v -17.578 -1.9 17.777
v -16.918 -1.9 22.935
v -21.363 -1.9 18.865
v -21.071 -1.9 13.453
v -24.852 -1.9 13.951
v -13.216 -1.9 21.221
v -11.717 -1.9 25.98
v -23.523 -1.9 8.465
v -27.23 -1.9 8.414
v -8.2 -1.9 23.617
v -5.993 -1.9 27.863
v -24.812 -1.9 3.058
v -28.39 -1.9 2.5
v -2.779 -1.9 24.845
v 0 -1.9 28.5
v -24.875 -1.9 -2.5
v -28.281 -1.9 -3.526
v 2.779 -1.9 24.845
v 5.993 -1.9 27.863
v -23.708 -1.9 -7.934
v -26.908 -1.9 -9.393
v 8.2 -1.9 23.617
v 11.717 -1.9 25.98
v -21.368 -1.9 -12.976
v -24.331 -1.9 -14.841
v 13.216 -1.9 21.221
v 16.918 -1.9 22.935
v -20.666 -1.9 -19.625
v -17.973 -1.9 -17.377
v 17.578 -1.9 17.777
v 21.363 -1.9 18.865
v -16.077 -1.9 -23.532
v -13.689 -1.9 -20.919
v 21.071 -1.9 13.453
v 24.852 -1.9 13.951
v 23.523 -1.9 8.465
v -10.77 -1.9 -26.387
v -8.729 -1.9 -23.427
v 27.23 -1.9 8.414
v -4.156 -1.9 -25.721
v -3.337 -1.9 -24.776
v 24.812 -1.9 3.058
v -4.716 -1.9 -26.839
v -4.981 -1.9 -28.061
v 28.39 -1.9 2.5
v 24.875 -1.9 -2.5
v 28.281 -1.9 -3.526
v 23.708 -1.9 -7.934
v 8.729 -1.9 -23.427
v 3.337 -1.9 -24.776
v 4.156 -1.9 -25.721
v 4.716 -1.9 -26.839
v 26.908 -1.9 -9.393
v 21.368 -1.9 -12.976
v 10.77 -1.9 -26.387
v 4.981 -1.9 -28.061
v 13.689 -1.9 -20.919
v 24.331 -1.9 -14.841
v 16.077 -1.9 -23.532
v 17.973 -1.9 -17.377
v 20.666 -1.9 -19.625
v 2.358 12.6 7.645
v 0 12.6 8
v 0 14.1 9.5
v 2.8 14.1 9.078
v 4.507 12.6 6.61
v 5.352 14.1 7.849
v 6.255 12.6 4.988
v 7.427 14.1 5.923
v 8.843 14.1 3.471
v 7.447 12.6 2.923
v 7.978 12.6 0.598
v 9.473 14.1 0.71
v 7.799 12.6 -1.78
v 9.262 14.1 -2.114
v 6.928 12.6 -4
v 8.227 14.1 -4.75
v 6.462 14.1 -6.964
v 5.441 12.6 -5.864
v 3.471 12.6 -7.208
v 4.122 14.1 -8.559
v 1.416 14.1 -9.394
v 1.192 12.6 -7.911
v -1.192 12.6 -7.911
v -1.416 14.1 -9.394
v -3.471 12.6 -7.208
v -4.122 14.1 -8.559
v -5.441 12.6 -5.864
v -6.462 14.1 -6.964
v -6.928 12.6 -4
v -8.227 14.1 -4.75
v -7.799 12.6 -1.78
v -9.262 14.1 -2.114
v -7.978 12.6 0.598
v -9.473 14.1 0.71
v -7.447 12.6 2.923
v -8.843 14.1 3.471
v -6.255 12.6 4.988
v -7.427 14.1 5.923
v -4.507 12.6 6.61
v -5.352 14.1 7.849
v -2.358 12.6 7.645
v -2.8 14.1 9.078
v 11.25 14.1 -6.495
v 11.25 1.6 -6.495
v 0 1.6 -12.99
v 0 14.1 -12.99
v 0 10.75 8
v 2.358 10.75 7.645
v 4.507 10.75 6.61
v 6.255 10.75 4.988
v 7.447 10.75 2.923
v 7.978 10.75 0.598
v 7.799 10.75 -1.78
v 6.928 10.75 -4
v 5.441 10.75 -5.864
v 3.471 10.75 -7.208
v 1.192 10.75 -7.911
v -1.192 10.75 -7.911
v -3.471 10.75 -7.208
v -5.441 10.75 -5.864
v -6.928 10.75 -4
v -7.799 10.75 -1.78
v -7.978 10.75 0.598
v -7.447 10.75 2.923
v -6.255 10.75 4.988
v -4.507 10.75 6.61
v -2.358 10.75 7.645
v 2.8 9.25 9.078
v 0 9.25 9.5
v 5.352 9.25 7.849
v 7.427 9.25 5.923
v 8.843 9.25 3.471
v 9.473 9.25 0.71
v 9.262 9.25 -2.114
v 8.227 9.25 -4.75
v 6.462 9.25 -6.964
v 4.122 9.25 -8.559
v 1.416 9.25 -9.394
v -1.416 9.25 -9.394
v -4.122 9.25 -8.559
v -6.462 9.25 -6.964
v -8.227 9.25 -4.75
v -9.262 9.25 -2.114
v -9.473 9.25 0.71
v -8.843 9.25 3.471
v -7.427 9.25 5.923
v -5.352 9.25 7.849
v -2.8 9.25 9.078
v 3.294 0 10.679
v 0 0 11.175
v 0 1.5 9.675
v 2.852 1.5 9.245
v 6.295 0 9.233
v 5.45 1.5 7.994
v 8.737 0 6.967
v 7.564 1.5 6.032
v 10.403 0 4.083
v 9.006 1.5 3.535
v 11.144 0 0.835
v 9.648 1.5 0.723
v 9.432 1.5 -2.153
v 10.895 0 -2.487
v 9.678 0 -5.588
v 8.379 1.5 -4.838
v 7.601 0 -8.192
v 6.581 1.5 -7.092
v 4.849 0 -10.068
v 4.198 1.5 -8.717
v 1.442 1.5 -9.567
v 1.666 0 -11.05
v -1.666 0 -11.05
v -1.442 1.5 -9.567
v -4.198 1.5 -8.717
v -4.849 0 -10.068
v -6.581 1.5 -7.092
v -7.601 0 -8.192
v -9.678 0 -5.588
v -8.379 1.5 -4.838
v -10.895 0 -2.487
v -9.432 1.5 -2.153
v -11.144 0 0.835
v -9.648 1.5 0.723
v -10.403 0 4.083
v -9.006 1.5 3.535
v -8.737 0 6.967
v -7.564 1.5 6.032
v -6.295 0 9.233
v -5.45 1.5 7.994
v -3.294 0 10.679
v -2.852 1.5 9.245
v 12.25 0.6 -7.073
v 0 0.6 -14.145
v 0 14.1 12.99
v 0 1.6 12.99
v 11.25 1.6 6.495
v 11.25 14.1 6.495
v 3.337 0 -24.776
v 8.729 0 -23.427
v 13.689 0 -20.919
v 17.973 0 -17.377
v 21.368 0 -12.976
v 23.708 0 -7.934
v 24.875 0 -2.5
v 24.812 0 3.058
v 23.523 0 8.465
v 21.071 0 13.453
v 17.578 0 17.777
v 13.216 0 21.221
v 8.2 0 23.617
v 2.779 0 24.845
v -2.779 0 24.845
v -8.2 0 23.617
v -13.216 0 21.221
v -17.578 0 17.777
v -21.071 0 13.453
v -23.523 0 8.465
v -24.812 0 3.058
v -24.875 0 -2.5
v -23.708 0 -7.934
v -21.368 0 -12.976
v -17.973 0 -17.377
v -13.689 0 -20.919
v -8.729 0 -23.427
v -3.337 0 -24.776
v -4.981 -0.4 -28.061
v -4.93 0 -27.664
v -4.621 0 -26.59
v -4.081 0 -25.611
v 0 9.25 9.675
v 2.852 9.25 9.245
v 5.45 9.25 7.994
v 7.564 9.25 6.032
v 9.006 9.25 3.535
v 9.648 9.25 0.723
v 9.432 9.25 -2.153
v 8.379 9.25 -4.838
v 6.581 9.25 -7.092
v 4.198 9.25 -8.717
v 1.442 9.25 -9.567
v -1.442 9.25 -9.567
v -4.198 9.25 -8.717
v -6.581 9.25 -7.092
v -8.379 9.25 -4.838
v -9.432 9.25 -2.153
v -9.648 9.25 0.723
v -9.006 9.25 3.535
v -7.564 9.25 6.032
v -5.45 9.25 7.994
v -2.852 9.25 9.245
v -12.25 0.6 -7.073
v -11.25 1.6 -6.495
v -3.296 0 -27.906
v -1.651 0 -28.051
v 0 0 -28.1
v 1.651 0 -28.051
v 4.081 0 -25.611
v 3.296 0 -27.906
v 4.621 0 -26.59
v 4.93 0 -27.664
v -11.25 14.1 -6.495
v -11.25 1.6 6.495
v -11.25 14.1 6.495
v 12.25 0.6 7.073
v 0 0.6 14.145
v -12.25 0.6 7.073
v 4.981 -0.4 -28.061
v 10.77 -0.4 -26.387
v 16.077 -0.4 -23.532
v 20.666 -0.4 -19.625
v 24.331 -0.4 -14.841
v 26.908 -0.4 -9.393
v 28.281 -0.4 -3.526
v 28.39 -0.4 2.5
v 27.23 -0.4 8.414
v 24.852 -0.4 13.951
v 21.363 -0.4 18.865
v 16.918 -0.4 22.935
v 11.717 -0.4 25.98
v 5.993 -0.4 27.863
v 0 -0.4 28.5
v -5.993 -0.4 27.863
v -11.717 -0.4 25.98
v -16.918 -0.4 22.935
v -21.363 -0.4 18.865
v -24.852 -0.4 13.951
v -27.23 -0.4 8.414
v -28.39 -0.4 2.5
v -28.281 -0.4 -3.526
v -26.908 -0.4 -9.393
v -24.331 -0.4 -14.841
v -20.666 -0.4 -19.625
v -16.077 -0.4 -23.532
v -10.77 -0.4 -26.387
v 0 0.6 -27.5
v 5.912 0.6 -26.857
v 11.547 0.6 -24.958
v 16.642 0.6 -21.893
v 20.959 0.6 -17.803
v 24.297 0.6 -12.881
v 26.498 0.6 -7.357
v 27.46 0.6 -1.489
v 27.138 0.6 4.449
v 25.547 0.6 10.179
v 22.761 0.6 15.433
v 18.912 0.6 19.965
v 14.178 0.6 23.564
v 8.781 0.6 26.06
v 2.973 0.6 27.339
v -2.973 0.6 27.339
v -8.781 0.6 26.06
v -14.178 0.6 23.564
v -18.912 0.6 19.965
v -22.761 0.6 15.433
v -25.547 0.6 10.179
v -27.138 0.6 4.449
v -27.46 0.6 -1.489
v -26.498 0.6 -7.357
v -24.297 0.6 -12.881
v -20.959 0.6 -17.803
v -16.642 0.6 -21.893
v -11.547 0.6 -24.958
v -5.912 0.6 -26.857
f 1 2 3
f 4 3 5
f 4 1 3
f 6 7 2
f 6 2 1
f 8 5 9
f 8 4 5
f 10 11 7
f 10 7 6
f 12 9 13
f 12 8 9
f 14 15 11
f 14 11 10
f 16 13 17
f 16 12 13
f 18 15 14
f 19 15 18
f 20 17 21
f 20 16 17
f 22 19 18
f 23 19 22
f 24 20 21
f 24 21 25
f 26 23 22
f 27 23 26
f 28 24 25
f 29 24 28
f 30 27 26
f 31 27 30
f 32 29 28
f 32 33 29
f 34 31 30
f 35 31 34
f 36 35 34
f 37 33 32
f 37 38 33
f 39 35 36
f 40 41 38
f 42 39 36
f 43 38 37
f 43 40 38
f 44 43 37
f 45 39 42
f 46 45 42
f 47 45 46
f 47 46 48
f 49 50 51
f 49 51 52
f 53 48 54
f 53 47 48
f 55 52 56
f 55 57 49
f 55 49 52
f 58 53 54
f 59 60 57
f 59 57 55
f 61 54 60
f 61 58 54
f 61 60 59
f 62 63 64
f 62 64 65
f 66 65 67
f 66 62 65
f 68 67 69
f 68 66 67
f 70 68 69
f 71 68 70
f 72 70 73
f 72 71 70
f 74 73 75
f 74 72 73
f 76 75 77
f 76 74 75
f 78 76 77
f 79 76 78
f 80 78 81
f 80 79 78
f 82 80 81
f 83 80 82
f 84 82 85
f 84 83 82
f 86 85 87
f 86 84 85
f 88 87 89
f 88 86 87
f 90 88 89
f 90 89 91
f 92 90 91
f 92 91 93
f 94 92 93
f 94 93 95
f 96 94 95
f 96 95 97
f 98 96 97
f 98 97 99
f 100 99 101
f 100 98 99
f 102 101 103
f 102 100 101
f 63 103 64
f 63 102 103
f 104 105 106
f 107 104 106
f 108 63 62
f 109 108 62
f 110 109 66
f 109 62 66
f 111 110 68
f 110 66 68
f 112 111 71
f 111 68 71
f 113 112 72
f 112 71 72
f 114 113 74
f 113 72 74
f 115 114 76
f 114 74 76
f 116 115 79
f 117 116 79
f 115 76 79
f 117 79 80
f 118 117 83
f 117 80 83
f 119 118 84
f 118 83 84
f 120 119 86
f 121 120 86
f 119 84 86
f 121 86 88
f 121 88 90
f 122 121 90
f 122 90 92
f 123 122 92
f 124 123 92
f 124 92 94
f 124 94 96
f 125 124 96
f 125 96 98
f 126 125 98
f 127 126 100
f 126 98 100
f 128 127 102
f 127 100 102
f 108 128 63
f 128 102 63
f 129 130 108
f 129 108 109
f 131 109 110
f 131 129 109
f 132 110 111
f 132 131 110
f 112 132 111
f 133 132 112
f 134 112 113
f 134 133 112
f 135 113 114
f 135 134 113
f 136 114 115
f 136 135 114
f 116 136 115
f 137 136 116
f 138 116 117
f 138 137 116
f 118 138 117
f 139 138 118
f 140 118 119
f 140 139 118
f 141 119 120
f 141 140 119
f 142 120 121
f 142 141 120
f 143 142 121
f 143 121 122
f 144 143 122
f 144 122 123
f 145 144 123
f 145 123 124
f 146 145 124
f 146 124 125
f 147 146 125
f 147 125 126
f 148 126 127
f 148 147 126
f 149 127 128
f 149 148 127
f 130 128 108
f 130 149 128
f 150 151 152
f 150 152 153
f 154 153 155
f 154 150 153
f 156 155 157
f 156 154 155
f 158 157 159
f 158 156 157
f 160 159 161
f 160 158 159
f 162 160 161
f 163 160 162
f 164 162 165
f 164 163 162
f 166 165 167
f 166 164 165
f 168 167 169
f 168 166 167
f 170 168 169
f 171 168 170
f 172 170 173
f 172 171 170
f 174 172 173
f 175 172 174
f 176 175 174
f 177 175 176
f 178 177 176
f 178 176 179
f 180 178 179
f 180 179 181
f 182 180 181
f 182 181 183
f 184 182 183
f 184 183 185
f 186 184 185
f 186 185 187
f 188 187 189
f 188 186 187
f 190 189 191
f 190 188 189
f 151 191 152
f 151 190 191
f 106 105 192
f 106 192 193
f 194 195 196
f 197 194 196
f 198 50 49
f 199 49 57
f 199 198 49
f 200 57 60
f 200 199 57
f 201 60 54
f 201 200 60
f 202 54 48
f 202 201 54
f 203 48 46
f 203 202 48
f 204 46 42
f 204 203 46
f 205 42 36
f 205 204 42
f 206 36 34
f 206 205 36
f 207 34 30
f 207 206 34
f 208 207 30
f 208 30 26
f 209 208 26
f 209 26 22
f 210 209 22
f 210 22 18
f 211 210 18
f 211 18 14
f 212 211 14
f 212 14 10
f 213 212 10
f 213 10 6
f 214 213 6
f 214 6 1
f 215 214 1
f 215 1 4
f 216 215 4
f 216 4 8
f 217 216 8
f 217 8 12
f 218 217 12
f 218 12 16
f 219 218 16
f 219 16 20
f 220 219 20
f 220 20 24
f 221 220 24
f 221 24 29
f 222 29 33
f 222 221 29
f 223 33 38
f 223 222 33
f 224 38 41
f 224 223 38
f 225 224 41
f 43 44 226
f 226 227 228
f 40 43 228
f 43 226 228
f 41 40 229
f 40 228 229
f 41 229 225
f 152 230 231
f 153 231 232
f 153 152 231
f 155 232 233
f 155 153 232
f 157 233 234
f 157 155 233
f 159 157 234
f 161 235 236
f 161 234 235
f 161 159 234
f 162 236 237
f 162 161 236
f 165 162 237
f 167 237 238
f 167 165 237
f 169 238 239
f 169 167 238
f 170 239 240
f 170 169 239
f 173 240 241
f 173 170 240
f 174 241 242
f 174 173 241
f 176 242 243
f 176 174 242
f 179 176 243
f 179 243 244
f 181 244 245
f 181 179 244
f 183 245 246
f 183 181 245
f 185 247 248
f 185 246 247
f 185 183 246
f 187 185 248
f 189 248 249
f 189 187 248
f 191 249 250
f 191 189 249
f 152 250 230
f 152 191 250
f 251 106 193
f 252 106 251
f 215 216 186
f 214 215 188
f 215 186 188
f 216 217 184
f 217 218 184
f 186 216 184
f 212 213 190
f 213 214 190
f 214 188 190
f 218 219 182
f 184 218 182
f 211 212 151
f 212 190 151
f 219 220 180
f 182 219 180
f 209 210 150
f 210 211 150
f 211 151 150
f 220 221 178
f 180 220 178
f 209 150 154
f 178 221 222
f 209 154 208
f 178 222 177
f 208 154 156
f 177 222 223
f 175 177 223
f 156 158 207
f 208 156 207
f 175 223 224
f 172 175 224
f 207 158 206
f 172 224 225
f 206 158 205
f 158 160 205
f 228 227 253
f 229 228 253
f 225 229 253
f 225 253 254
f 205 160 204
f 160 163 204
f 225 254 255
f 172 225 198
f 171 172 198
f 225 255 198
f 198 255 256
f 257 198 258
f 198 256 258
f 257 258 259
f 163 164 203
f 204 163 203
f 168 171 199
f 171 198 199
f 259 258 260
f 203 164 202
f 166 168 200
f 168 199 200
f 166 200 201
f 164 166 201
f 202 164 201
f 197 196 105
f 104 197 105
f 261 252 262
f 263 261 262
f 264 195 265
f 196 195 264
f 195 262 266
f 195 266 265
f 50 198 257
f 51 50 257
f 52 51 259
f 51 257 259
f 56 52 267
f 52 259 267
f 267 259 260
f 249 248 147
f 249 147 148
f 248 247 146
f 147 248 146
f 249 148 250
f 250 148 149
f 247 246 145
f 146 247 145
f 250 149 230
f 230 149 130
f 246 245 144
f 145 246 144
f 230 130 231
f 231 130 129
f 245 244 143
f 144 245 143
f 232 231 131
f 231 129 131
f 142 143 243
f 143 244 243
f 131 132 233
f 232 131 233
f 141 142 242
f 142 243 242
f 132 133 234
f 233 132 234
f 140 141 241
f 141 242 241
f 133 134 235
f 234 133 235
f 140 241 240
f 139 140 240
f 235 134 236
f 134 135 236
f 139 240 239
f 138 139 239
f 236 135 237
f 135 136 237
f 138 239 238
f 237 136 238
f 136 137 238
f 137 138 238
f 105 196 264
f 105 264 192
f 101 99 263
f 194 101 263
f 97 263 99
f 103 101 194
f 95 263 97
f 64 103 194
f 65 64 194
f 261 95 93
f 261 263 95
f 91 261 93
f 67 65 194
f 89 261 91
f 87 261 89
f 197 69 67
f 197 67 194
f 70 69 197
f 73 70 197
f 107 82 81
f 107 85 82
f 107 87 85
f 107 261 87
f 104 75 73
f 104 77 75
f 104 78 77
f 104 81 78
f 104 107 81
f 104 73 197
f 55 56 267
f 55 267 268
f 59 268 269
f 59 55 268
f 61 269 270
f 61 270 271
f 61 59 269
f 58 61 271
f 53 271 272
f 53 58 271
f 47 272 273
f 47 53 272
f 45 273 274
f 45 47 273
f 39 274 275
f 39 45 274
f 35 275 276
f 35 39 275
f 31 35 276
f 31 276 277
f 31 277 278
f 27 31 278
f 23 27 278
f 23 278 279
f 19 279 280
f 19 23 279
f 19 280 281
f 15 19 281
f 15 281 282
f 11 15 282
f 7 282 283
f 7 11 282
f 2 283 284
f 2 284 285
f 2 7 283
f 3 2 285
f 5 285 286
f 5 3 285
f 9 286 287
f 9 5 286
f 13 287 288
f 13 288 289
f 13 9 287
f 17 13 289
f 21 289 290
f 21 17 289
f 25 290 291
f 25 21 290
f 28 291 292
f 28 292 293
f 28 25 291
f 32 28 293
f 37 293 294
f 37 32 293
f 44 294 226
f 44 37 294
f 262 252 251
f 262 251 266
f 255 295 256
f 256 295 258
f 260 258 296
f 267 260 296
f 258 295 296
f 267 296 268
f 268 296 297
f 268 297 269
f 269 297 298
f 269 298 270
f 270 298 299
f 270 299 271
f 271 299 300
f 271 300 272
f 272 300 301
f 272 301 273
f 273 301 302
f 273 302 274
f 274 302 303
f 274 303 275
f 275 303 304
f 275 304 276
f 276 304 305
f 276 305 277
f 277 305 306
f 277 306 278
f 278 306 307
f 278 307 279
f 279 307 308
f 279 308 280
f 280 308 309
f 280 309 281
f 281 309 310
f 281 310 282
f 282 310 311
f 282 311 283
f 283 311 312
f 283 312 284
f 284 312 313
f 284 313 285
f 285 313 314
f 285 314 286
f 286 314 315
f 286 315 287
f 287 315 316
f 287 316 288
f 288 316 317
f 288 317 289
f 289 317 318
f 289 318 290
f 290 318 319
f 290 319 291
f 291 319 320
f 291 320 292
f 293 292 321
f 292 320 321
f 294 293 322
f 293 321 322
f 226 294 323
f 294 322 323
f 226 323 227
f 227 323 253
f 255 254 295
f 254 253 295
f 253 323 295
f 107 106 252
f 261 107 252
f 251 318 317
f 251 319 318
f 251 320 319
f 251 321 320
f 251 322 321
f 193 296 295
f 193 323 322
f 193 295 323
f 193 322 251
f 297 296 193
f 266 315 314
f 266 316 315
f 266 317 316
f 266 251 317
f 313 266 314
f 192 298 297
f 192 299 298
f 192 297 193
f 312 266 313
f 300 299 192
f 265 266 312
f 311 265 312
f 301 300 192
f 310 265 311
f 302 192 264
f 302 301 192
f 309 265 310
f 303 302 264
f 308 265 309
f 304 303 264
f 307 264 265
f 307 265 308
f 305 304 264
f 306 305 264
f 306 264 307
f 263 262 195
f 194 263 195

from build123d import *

# Parameters (mm, degrees)
SKETCH1_R                       = 27
SKETCH1_R_2                     = 9.675
BOSS_EXTRUDE1_DEPTH             = 0.6
SKETCH2_R                       = 9.675
BOSS_EXTRUDE2_DEPTH             = 13.5
SKETCH3_R                       = 10.043523413
SKETCH3_R_2                     = 8
BOSS_EXTRUDE3_DEPTH             = 4.85
CHAMFER1_SIZE                   = 1.5
SKETCH4_R                       = 28.5
SKETCH4_R_2                     = 25
BOSS_EXTRUDE4_DEPTH             = 1.9
BOSS_EXTRUDE4_DIRECTION_2_REACH = 42.704
CHAMFER2_SIZE                   = 1
CHAMFER3_SIZE                   = 1
CUT_EXTRUDE1_DEPTH              = 8.4


with BuildPart() as part:
    # Sketch1 → Boss-Extrude1 (new body)
    with BuildSketch(Plane(origin=(0, 0, 0), x_dir=(1, 0, 0), z_dir=(0, 1, 0))):
        with Locations(Location((0, 0, 0), (0, 0, 270))):
            Circle(SKETCH1_R)
        with Locations(Location((0, 0, 0), (0, 0, 270))):
            Circle(SKETCH1_R_2, mode=Mode.SUBTRACT)
    extrude(amount=BOSS_EXTRUDE1_DEPTH)

    # Sketch2 → Boss-Extrude2 (add)
    with BuildSketch(Plane(origin=(0, 0.6, 0), x_dir=(1, 0, 0), z_dir=(0, 1, 0))):
        Polygon((0, 12.990381057), (-11.25, 6.495190528), (-11.25, -6.495190528), (0, -12.990381057), (11.25, -6.495190528), (11.25, 6.495190528), align=None)
        with Locations(Location((0, 0, 0), (0, 0, 270))):
            Circle(SKETCH2_R, mode=Mode.SUBTRACT)
    extrude(amount=BOSS_EXTRUDE2_DEPTH)

    # Sketch3 → Boss-Extrude3 (add)
    with BuildSketch(Plane(origin=(0, 14.1, 0), x_dir=(1, 0, 0), z_dir=(0, 1, 0))):
        Circle(SKETCH3_R)
        with Locations(Location((0, 0, 0), (0, 0, 270))):
            Circle(SKETCH3_R_2, mode=Mode.SUBTRACT)
    extrude(amount=-BOSS_EXTRUDE3_DEPTH)

    # Chamfer1
    chamfer1_edges = [part.edges().sort_by_distance(p)[0] for p in [
        (0, 9.25, -8),
        (0, 14.1, -8),
        (0, 0, -9.675),
    ]]
    chamfer(chamfer1_edges, length=CHAMFER1_SIZE)

    # Sketch4 → Boss-Extrude4 (add)
    with BuildSketch(Plane.XZ):
        with Locations(Location((0, 0, 0), (0, 0, 270))):
            Circle(SKETCH4_R)
        with Locations(Location((0, 0, 0), (0, 0, 270))):
            Circle(SKETCH4_R_2, mode=Mode.SUBTRACT)
    extrude(amount=BOSS_EXTRUDE4_DEPTH)

    # Boss-Extrude4 direction 2: up to this face of the body (flat: up to its plane)
    boss_extrude4_direction_2_end = Plane(part.part.faces().sort_by_distance((0, 0.6, -26.236324676))[0])
    # Sketch4 → Boss-Extrude4 direction 2 (add, up to the picked face)
    with BuildSketch(Plane.XZ, mode=Mode.PRIVATE) as boss_extrude4_direction_2_sk1:
        with Locations(Location((0, 0, 0), (0, 0, 270))):
            Circle(SKETCH4_R)
        with Locations(Location((0, 0, 0), (0, 0, 270))):
            Circle(SKETCH4_R_2, mode=Mode.SUBTRACT)
    boss_extrude4_direction_2_tool1 = split(extrude(boss_extrude4_direction_2_sk1.sketch, amount=-BOSS_EXTRUDE4_DIRECTION_2_REACH, mode=Mode.PRIVATE), bisect_by=boss_extrude4_direction_2_end, keep=Keep.BOTH, mode=Mode.PRIVATE)
    add(boss_extrude4_direction_2_tool1.solids().sort_by(Axis((0, 0, 27.693898), (0, 1, 0)))[0])

    # Chamfer2
    chamfer2_edges = [part.edges().sort_by_distance(p)[0] for p in [
        (0, 0.6, 28.5),
    ]]
    chamfer(chamfer2_edges, length=CHAMFER2_SIZE)

    # Chamfer3
    chamfer3_edges = [part.edges().sort_by_distance(p)[0] for p in [
        (5.625, 0.6, -9.742785793),
        (-5.625, 0.6, -9.742785793),
        (-11.25, 0.6, 0),
        (-5.625, 0.6, 9.742785793),
        (5.625, 0.6, 9.742785793),
        (11.25, 0.6, 0),
    ]]
    chamfer(chamfer3_edges, length=CHAMFER3_SIZE)

    # Sketch5 → Cut-Extrude1 (cut)
    with BuildSketch(Plane(origin=(0, 0, 0), x_dir=(1, 0, 0), z_dir=(0, 1, 0))):
        with BuildLine():
            ThreePointArc((3.336791258, 24.776315789), (0, 33.5), (-3.336791258, 24.776315789))
            ThreePointArc((-3.336791258, 24.776315789), (0, 25), (3.336791258, 24.776315789))
        make_face()
    extrude(amount=-CUT_EXTRUDE1_DEPTH, mode=Mode.SUBTRACT)


solid = part.part
